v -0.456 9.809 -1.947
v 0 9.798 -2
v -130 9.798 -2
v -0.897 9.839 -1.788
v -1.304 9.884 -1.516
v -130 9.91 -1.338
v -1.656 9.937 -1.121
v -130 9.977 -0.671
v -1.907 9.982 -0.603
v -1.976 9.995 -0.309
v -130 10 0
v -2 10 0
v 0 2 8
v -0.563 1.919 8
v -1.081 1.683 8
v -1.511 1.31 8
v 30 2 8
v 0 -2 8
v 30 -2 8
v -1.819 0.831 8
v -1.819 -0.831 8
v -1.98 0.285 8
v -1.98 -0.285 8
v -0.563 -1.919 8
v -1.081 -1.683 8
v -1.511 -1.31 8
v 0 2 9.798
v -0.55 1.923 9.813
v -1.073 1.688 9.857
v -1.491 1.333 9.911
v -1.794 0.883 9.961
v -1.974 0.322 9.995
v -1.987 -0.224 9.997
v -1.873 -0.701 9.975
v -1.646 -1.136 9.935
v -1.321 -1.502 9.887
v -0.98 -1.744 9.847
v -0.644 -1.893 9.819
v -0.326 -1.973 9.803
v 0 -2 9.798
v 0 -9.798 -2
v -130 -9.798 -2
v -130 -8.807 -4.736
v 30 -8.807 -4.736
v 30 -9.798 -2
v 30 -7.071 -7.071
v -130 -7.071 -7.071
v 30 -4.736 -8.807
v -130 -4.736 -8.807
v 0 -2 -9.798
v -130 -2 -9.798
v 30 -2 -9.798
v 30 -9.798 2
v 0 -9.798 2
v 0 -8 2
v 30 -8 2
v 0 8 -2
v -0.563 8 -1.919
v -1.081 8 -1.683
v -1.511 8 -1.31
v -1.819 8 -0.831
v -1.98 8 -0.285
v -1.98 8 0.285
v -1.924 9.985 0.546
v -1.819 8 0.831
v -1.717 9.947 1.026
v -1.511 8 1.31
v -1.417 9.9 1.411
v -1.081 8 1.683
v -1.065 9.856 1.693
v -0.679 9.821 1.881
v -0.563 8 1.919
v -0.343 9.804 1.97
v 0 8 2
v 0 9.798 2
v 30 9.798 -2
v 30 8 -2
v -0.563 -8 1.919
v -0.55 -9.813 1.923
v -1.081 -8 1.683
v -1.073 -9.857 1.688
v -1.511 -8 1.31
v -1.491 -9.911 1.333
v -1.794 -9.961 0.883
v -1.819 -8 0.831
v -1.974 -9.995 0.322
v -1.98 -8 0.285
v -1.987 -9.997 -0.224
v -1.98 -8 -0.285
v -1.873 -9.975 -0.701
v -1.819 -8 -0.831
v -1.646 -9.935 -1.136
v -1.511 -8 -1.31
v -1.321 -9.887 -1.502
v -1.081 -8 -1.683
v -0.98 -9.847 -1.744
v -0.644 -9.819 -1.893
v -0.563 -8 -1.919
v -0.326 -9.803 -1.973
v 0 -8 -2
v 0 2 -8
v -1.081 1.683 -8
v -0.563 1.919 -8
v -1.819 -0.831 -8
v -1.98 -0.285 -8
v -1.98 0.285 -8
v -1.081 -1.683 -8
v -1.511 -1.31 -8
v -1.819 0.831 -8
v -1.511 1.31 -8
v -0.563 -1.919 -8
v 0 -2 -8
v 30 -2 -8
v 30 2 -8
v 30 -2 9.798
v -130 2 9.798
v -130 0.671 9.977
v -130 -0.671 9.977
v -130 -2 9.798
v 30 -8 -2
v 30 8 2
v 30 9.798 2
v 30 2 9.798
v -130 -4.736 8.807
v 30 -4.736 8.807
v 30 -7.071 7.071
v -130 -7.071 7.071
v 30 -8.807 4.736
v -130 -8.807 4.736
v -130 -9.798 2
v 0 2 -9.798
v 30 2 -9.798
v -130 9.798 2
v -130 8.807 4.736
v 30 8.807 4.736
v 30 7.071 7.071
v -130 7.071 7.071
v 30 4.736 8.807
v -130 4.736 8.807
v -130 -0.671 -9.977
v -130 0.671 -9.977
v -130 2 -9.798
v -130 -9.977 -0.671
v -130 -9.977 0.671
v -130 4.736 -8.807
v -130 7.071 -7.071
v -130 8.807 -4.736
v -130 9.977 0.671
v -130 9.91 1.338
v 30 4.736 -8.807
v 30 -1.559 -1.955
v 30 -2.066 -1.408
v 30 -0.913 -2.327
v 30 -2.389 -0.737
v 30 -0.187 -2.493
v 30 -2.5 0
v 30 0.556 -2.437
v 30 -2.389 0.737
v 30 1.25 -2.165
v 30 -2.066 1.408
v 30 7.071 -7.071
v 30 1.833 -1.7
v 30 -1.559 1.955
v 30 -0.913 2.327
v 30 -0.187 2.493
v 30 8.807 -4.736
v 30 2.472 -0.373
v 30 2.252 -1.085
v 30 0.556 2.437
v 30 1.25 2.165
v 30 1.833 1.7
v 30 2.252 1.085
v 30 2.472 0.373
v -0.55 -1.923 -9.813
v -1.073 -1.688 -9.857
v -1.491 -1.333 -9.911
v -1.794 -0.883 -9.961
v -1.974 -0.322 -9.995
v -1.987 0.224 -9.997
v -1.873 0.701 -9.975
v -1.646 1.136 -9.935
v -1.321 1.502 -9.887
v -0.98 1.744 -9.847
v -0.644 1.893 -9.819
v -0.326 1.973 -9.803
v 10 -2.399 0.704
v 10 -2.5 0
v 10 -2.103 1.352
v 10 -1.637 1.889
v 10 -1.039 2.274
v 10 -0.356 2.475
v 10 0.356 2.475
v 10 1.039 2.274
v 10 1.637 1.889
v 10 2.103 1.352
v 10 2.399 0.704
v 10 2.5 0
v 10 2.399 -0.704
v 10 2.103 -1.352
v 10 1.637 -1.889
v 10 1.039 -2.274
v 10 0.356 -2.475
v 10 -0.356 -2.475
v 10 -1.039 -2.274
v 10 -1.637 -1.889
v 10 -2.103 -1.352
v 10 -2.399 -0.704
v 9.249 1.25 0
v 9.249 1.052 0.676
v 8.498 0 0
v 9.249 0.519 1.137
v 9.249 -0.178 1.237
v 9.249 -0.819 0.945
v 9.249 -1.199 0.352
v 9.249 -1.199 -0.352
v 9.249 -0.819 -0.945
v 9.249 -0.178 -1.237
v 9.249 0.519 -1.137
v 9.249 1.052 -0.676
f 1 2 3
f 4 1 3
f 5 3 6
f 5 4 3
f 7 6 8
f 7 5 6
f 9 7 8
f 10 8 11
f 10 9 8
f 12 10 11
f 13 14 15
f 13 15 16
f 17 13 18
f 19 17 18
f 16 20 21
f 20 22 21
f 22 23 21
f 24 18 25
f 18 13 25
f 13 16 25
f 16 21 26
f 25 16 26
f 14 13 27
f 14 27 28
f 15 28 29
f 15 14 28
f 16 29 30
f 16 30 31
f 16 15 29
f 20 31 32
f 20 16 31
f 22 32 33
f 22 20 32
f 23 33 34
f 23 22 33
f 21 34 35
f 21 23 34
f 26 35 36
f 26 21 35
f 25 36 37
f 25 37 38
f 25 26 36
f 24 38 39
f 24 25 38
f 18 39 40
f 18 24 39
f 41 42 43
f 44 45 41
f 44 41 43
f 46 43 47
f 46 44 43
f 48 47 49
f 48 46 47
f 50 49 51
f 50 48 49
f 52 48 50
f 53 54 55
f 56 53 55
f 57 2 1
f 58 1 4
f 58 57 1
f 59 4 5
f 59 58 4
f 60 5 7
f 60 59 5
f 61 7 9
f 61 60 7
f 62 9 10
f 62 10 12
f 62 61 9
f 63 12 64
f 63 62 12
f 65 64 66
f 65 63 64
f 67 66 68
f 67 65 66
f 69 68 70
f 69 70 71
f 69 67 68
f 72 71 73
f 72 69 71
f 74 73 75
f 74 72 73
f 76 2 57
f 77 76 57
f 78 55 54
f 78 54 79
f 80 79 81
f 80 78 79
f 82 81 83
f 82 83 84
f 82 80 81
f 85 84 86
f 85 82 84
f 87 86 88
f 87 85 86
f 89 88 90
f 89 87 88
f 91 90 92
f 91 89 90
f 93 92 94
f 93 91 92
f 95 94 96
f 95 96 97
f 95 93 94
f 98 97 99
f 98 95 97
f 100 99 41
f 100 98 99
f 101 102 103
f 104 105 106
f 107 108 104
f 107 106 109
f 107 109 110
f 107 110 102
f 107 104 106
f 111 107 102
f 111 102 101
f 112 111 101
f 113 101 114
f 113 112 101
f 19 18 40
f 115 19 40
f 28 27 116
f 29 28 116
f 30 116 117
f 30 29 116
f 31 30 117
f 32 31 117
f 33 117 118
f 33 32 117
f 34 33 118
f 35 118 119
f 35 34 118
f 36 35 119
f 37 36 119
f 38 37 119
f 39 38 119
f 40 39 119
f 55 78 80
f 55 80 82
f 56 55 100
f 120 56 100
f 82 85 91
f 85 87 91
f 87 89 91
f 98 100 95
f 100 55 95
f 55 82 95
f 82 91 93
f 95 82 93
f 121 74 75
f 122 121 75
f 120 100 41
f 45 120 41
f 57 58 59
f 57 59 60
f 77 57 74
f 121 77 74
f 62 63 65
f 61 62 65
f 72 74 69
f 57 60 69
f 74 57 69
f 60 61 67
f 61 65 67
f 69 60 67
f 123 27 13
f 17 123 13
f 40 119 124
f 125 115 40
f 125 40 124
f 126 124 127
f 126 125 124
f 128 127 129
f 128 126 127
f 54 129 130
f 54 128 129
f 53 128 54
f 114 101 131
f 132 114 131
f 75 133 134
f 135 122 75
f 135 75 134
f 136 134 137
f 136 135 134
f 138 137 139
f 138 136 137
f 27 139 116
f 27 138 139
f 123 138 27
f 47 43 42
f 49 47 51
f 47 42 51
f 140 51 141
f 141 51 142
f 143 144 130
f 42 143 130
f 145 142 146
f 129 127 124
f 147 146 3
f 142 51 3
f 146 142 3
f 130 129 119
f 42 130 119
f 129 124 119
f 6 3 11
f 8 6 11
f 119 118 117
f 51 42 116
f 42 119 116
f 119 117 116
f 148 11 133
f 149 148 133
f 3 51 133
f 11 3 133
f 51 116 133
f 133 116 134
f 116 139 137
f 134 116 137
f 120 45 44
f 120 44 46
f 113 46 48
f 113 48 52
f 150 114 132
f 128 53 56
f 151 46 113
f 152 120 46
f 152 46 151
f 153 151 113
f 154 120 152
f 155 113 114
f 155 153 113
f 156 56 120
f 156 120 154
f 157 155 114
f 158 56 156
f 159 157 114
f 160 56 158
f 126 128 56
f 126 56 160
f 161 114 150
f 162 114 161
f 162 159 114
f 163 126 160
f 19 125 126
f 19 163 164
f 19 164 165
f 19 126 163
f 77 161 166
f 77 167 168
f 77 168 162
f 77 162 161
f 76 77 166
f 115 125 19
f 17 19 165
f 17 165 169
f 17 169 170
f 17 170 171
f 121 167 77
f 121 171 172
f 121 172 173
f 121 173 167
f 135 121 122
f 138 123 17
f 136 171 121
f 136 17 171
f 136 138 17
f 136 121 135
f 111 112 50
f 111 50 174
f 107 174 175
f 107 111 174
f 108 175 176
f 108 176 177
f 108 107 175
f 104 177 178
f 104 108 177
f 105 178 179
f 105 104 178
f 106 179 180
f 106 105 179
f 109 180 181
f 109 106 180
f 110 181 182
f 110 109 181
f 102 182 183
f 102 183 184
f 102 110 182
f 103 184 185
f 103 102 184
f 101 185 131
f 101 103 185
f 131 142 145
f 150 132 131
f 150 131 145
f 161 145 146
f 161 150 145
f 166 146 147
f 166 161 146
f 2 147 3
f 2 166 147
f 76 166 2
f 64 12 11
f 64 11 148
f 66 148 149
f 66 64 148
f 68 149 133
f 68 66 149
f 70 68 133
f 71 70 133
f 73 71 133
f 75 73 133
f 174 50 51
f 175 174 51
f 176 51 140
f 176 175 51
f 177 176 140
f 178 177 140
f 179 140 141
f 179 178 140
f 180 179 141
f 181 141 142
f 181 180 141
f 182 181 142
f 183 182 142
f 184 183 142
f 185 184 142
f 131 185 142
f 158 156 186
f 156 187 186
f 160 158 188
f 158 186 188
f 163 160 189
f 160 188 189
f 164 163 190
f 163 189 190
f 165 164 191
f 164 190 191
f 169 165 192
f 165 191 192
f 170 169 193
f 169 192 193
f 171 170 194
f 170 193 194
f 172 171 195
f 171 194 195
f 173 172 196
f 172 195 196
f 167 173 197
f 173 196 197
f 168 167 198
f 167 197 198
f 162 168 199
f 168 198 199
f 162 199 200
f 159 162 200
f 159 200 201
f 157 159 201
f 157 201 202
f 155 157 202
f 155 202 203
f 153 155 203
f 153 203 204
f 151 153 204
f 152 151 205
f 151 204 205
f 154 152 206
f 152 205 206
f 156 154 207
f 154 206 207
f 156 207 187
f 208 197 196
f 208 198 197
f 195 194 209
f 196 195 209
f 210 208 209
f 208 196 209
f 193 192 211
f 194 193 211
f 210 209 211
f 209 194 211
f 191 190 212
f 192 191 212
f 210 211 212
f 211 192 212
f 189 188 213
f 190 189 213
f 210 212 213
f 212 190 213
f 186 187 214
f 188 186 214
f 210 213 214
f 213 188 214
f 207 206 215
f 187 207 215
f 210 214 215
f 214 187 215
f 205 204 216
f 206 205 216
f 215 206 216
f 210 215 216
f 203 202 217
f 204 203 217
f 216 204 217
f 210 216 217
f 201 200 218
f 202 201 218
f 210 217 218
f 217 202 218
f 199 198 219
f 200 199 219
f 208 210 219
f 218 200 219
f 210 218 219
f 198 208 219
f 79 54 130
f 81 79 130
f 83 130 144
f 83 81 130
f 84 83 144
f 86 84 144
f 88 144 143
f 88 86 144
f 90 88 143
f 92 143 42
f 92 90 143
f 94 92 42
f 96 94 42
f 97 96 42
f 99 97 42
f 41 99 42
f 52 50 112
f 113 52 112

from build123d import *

# Parameters (mm, degrees)
F0_W      = 4
F0_H      = 4
F1_DEPTH  = 30
F2_DEPTH  = 130
F3_R      = 2
F4_DEPTH  = 25
F5_R      = 2
F6_DEPTH  = 25
F7_R      = 2
F8_DEPTH  = 25
F9_R      = 2
F10_DEPTH = 25
F12_D     = 5
F12_DEPTH = 20
F12_TIP   = 1.5021515476


with BuildPart() as f1:
    # F0 (on Right) → F1 (new body)
    with BuildSketch(Plane.YZ):
        with BuildLine():
            ThreePointArc((2, 7.2284161474), (5.3033008589, 5.3033008589), (7.2284161474, 2))
            Line((7.2284161474, 2), (8, 2))
            Line((8, 2), (9.7979589711, 2))
            ThreePointArc((9.7979589711, 2), (7.0710678119, 7.0710678119), (2, 9.7979589711))
            Line((2, 9.7979589711), (2, 8))
            Line((2, 8), (2, 7.2284161474))
        make_face()
        with BuildLine():
            ThreePointArc((-7.2284161474, 2), (-5.3033008589, 5.3033008589), (-2, 7.2284161474))
            Line((-2, 7.2284161474), (-2, 8))
            Line((-2, 8), (-2, 9.7979589711))
            ThreePointArc((-2, 9.7979589711), (-7.0710678119, 7.0710678119), (-9.7979589711, 2))
            Line((-9.7979589711, 2), (-8, 2))
            Line((-8, 2), (-7.2284161474, 2))
        make_face()
        with BuildLine():
            Line((2, 2), (7.2284161474, 2))
            ThreePointArc((7.2284161474, 2), (5.3033008589, 5.3033008589), (2, 7.2284161474))
            Line((2, 7.2284161474), (2, 2))
        make_face()
        with BuildLine():
            Line((2, 2), (2, 7.2284161474))
            ThreePointArc((2, 7.2284161474), (0, 7.5), (-2, 7.2284161474))
            Line((-2, 7.2284161474), (-2, 2))
            Line((-2, 2), (2, 2))
        make_face()
        with BuildLine():
            Line((-2, 2), (-2, 7.2284161474))
            ThreePointArc((-2, 7.2284161474), (-5.3033008589, 5.3033008589), (-7.2284161474, 2))
            Line((-7.2284161474, 2), (-2, 2))
        make_face()
        with BuildLine():
            Line((-2, -2), (-2, 2))
            Line((-2, 2), (-7.2284161474, 2))
            ThreePointArc((-7.2284161474, 2), (-7.5, 0), (-7.2284161474, -2))
            Line((-7.2284161474, -2), (-2, -2))
        make_face()
        with BuildLine():
            ThreePointArc((7.2284161474, -2), (7.4317938987, -1.0091776094), (7.5, 0))
            ThreePointArc((7.5, 0), (7.4317938987, 1.0091776094), (7.2284161474, 2))
            Line((7.2284161474, 2), (2, 2))
            Line((2, 2), (2, -2))
            Line((2, -2), (7.2284161474, -2))
        make_face()
        Rectangle(F0_W, F0_H)
        with BuildLine():
            ThreePointArc((-2, -7.2284161474), (0, -7.5), (2, -7.2284161474))
            Line((2, -7.2284161474), (2, -2))
            Line((2, -2), (-2, -2))
            Line((-2, -2), (-2, -7.2284161474))
        make_face()
        with BuildLine():
            ThreePointArc((-7.2284161474, -2), (-5.3033008589, -5.3033008589), (-2, -7.2284161474))
            Line((-2, -7.2284161474), (-2, -2))
            Line((-2, -2), (-7.2284161474, -2))
        make_face()
        with BuildLine():
            ThreePointArc((2, -7.2284161474), (5.3033008589, -5.3033008589), (7.2284161474, -2))
            Line((7.2284161474, -2), (2, -2))
            Line((2, -2), (2, -7.2284161474))
        make_face()
        with BuildLine():
            Line((8, -2), (7.2284161474, -2))
            ThreePointArc((7.2284161474, -2), (5.3033008589, -5.3033008589), (2, -7.2284161474))
            Line((2, -7.2284161474), (2, -8))
            Line((2, -8), (2, -9.7979589711))
            ThreePointArc((2, -9.7979589711), (7.0710678119, -7.0710678119), (9.7979589711, -2))
            Line((9.7979589711, -2), (8, -2))
        make_face()
        with BuildLine():
            Line((-2, -8), (-2, -7.2284161474))
            ThreePointArc((-2, -7.2284161474), (-5.3033008589, -5.3033008589), (-7.2284161474, -2))
            Line((-7.2284161474, -2), (-8, -2))
            Line((-8, -2), (-9.7979589711, -2))
            ThreePointArc((-9.7979589711, -2), (-7.0710678119, -7.0710678119), (-2, -9.7979589711))
            Line((-2, -9.7979589711), (-2, -8))
        make_face()
        with BuildLine():
            Line((2, -8), (2, -7.2284161474))
            ThreePointArc((2, -7.2284161474), (0, -7.5), (-2, -7.2284161474))
            Line((-2, -7.2284161474), (-2, -8))
            Line((-2, -8), (2, -8))
        make_face()
        with BuildLine():
            ThreePointArc((7.2284161474, 2), (7.4317938987, 1.0091776094), (7.5, 0))
            ThreePointArc((7.5, 0), (7.4317938987, -1.0091776094), (7.2284161474, -2))
            Line((7.2284161474, -2), (8, -2))
            Line((8, -2), (8, 2))
            Line((8, 2), (7.2284161474, 2))
        make_face()
        with BuildLine():
            ThreePointArc((-2, 7.2284161474), (0, 7.5), (2, 7.2284161474))
            Line((2, 7.2284161474), (2, 8))
            Line((2, 8), (-2, 8))
            Line((-2, 8), (-2, 7.2284161474))
        make_face()
        with BuildLine():
            ThreePointArc((-7.2284161474, -2), (-7.5, 0), (-7.2284161474, 2))
            Line((-7.2284161474, 2), (-8, 2))
            Line((-8, 2), (-8, -2))
            Line((-8, -2), (-7.2284161474, -2))
        make_face()
    extrude(amount=F1_DEPTH)

    # F0 (on Right) → F2 (join)
    with BuildSketch(Plane.YZ):
        with BuildLine():
            Line((-2, 8), (2, 8))
            Line((2, 8), (2, 9.7979589711))
            ThreePointArc((2, 9.7979589711), (0, 10), (-2, 9.7979589711))
            Line((-2, 9.7979589711), (-2, 8))
        make_face()
        with BuildLine():
            ThreePointArc((2, 7.2284161474), (5.3033008589, 5.3033008589), (7.2284161474, 2))
            Line((7.2284161474, 2), (8, 2))
            Line((8, 2), (9.7979589711, 2))
            ThreePointArc((9.7979589711, 2), (7.0710678119, 7.0710678119), (2, 9.7979589711))
            Line((2, 9.7979589711), (2, 8))
            Line((2, 8), (2, 7.2284161474))
        make_face()
        with BuildLine():
            ThreePointArc((-2, 7.2284161474), (0, 7.5), (2, 7.2284161474))
            Line((2, 7.2284161474), (2, 8))
            Line((2, 8), (-2, 8))
            Line((-2, 8), (-2, 7.2284161474))
        make_face()
        with BuildLine():
            ThreePointArc((-7.2284161474, 2), (-5.3033008589, 5.3033008589), (-2, 7.2284161474))
            Line((-2, 7.2284161474), (-2, 8))
            Line((-2, 8), (-2, 9.7979589711))
            ThreePointArc((-2, 9.7979589711), (-7.0710678119, 7.0710678119), (-9.7979589711, 2))
            Line((-9.7979589711, 2), (-8, 2))
            Line((-8, 2), (-7.2284161474, 2))
        make_face()
        with BuildLine():
            ThreePointArc((-7.2284161474, -2), (-7.5, 0), (-7.2284161474, 2))
            Line((-7.2284161474, 2), (-8, 2))
            Line((-8, 2), (-8, -2))
            Line((-8, -2), (-7.2284161474, -2))
        make_face()
        with BuildLine():
            Line((-8, -2), (-8, 2))
            Line((-8, 2), (-9.7979589711, 2))
            ThreePointArc((-9.7979589711, 2), (-10, 0), (-9.7979589711, -2))
            Line((-9.7979589711, -2), (-8, -2))
        make_face()
        with BuildLine():
            Line((-2, 2), (-2, 7.2284161474))
            ThreePointArc((-2, 7.2284161474), (-5.3033008589, 5.3033008589), (-7.2284161474, 2))
            Line((-7.2284161474, 2), (-2, 2))
        make_face()
        with BuildLine():
            Line((2, 2), (2, 7.2284161474))
            ThreePointArc((2, 7.2284161474), (0, 7.5), (-2, 7.2284161474))
            Line((-2, 7.2284161474), (-2, 2))
            Line((-2, 2), (2, 2))
        make_face()
        with BuildLine():
            Line((2, 2), (7.2284161474, 2))
            ThreePointArc((7.2284161474, 2), (5.3033008589, 5.3033008589), (2, 7.2284161474))
            Line((2, 7.2284161474), (2, 2))
        make_face()
        with BuildLine():
            Line((9.7979589711, 2), (8, 2))
            Line((8, 2), (8, -2))
            Line((8, -2), (9.7979589711, -2))
            ThreePointArc((9.7979589711, -2), (9.9493615301, -1.0050896201), (10, 0))
            ThreePointArc((10, 0), (9.9493615301, 1.0050896201), (9.7979589711, 2))
        make_face()
        with BuildLine():
            ThreePointArc((7.2284161474, 2), (7.4317938987, 1.0091776094), (7.5, 0))
            ThreePointArc((7.5, 0), (7.4317938987, -1.0091776094), (7.2284161474, -2))
            Line((7.2284161474, -2), (8, -2))
            Line((8, -2), (8, 2))
            Line((8, 2), (7.2284161474, 2))
        make_face()
        with BuildLine():
            ThreePointArc((7.2284161474, -2), (7.4317938987, -1.0091776094), (7.5, 0))
            ThreePointArc((7.5, 0), (7.4317938987, 1.0091776094), (7.2284161474, 2))
            Line((7.2284161474, 2), (2, 2))
            Line((2, 2), (2, -2))
            Line((2, -2), (7.2284161474, -2))
        make_face()
        Rectangle(F0_W, F0_H)
        with BuildLine():
            Line((-2, -2), (-2, 2))
            Line((-2, 2), (-7.2284161474, 2))
            ThreePointArc((-7.2284161474, 2), (-7.5, 0), (-7.2284161474, -2))
            Line((-7.2284161474, -2), (-2, -2))
        make_face()
        with BuildLine():
            ThreePointArc((-7.2284161474, -2), (-5.3033008589, -5.3033008589), (-2, -7.2284161474))
            Line((-2, -7.2284161474), (-2, -2))
            Line((-2, -2), (-7.2284161474, -2))
        make_face()
        with BuildLine():
            Line((-2, -8), (-2, -7.2284161474))
            ThreePointArc((-2, -7.2284161474), (-5.3033008589, -5.3033008589), (-7.2284161474, -2))
            Line((-7.2284161474, -2), (-8, -2))
            Line((-8, -2), (-9.7979589711, -2))
            ThreePointArc((-9.7979589711, -2), (-7.0710678119, -7.0710678119), (-2, -9.7979589711))
            Line((-2, -9.7979589711), (-2, -8))
        make_face()
        with BuildLine():
            Line((2, -8), (2, -7.2284161474))
            ThreePointArc((2, -7.2284161474), (0, -7.5), (-2, -7.2284161474))
            Line((-2, -7.2284161474), (-2, -8))
            Line((-2, -8), (2, -8))
        make_face()
        with BuildLine():
            Line((2, -9.7979589711), (2, -8))
            Line((2, -8), (-2, -8))
            Line((-2, -8), (-2, -9.7979589711))
            ThreePointArc((-2, -9.7979589711), (0, -10), (2, -9.7979589711))
        make_face()
        with BuildLine():
            ThreePointArc((2, -7.2284161474), (5.3033008589, -5.3033008589), (7.2284161474, -2))
            Line((7.2284161474, -2), (2, -2))
            Line((2, -2), (2, -7.2284161474))
        make_face()
        with BuildLine():
            Line((8, -2), (7.2284161474, -2))
            ThreePointArc((7.2284161474, -2), (5.3033008589, -5.3033008589), (2, -7.2284161474))
            Line((2, -7.2284161474), (2, -8))
            Line((2, -8), (2, -9.7979589711))
            ThreePointArc((2, -9.7979589711), (7.0710678119, -7.0710678119), (9.7979589711, -2))
            Line((9.7979589711, -2), (8, -2))
        make_face()
        with BuildLine():
            ThreePointArc((-2, -7.2284161474), (0, -7.5), (2, -7.2284161474))
            Line((2, -7.2284161474), (2, -2))
            Line((2, -2), (-2, -2))
            Line((-2, -2), (-2, -7.2284161474))
        make_face()
    extrude(amount=-F2_DEPTH)

    # F3 (on face) → F4 (cut)
    with BuildSketch(Plane.XY.offset(8)):
        Circle(F3_R)
    extrude(amount=F4_DEPTH, mode=Mode.SUBTRACT)

    # F5 (on face) → F6 (cut)
    with BuildSketch(Plane.XZ.offset(8)):
        Circle(F5_R)
    extrude(amount=F6_DEPTH, mode=Mode.SUBTRACT)

    # F7 (on face) → F8 (cut)
    with BuildSketch(Plane(origin=(0, 0, -8), x_dir=(1, 0, 0), z_dir=(0, 0, -1))):
        Circle(F7_R)
    extrude(amount=F8_DEPTH, mode=Mode.SUBTRACT)

    # F9 (on face) → F10 (cut)
    with BuildSketch(Plane(origin=(0, 8, 0), x_dir=(-1, 0, 0), z_dir=(0, 1, 0))):
        Circle(F9_R)
    extrude(amount=F10_DEPTH, mode=Mode.SUBTRACT)

    # F12
    with Locations(Plane.YZ.offset(30)):
        with Locations((0, 0)):
            Hole(F12_D / 2, depth=F12_DEPTH)
            with Locations((0, 0, -(F12_DEPTH + F12_TIP / 2))):  # 118° drill point
                Cone(0, F12_D / 2, F12_TIP, mode=Mode.SUBTRACT)


solid = f1.part
